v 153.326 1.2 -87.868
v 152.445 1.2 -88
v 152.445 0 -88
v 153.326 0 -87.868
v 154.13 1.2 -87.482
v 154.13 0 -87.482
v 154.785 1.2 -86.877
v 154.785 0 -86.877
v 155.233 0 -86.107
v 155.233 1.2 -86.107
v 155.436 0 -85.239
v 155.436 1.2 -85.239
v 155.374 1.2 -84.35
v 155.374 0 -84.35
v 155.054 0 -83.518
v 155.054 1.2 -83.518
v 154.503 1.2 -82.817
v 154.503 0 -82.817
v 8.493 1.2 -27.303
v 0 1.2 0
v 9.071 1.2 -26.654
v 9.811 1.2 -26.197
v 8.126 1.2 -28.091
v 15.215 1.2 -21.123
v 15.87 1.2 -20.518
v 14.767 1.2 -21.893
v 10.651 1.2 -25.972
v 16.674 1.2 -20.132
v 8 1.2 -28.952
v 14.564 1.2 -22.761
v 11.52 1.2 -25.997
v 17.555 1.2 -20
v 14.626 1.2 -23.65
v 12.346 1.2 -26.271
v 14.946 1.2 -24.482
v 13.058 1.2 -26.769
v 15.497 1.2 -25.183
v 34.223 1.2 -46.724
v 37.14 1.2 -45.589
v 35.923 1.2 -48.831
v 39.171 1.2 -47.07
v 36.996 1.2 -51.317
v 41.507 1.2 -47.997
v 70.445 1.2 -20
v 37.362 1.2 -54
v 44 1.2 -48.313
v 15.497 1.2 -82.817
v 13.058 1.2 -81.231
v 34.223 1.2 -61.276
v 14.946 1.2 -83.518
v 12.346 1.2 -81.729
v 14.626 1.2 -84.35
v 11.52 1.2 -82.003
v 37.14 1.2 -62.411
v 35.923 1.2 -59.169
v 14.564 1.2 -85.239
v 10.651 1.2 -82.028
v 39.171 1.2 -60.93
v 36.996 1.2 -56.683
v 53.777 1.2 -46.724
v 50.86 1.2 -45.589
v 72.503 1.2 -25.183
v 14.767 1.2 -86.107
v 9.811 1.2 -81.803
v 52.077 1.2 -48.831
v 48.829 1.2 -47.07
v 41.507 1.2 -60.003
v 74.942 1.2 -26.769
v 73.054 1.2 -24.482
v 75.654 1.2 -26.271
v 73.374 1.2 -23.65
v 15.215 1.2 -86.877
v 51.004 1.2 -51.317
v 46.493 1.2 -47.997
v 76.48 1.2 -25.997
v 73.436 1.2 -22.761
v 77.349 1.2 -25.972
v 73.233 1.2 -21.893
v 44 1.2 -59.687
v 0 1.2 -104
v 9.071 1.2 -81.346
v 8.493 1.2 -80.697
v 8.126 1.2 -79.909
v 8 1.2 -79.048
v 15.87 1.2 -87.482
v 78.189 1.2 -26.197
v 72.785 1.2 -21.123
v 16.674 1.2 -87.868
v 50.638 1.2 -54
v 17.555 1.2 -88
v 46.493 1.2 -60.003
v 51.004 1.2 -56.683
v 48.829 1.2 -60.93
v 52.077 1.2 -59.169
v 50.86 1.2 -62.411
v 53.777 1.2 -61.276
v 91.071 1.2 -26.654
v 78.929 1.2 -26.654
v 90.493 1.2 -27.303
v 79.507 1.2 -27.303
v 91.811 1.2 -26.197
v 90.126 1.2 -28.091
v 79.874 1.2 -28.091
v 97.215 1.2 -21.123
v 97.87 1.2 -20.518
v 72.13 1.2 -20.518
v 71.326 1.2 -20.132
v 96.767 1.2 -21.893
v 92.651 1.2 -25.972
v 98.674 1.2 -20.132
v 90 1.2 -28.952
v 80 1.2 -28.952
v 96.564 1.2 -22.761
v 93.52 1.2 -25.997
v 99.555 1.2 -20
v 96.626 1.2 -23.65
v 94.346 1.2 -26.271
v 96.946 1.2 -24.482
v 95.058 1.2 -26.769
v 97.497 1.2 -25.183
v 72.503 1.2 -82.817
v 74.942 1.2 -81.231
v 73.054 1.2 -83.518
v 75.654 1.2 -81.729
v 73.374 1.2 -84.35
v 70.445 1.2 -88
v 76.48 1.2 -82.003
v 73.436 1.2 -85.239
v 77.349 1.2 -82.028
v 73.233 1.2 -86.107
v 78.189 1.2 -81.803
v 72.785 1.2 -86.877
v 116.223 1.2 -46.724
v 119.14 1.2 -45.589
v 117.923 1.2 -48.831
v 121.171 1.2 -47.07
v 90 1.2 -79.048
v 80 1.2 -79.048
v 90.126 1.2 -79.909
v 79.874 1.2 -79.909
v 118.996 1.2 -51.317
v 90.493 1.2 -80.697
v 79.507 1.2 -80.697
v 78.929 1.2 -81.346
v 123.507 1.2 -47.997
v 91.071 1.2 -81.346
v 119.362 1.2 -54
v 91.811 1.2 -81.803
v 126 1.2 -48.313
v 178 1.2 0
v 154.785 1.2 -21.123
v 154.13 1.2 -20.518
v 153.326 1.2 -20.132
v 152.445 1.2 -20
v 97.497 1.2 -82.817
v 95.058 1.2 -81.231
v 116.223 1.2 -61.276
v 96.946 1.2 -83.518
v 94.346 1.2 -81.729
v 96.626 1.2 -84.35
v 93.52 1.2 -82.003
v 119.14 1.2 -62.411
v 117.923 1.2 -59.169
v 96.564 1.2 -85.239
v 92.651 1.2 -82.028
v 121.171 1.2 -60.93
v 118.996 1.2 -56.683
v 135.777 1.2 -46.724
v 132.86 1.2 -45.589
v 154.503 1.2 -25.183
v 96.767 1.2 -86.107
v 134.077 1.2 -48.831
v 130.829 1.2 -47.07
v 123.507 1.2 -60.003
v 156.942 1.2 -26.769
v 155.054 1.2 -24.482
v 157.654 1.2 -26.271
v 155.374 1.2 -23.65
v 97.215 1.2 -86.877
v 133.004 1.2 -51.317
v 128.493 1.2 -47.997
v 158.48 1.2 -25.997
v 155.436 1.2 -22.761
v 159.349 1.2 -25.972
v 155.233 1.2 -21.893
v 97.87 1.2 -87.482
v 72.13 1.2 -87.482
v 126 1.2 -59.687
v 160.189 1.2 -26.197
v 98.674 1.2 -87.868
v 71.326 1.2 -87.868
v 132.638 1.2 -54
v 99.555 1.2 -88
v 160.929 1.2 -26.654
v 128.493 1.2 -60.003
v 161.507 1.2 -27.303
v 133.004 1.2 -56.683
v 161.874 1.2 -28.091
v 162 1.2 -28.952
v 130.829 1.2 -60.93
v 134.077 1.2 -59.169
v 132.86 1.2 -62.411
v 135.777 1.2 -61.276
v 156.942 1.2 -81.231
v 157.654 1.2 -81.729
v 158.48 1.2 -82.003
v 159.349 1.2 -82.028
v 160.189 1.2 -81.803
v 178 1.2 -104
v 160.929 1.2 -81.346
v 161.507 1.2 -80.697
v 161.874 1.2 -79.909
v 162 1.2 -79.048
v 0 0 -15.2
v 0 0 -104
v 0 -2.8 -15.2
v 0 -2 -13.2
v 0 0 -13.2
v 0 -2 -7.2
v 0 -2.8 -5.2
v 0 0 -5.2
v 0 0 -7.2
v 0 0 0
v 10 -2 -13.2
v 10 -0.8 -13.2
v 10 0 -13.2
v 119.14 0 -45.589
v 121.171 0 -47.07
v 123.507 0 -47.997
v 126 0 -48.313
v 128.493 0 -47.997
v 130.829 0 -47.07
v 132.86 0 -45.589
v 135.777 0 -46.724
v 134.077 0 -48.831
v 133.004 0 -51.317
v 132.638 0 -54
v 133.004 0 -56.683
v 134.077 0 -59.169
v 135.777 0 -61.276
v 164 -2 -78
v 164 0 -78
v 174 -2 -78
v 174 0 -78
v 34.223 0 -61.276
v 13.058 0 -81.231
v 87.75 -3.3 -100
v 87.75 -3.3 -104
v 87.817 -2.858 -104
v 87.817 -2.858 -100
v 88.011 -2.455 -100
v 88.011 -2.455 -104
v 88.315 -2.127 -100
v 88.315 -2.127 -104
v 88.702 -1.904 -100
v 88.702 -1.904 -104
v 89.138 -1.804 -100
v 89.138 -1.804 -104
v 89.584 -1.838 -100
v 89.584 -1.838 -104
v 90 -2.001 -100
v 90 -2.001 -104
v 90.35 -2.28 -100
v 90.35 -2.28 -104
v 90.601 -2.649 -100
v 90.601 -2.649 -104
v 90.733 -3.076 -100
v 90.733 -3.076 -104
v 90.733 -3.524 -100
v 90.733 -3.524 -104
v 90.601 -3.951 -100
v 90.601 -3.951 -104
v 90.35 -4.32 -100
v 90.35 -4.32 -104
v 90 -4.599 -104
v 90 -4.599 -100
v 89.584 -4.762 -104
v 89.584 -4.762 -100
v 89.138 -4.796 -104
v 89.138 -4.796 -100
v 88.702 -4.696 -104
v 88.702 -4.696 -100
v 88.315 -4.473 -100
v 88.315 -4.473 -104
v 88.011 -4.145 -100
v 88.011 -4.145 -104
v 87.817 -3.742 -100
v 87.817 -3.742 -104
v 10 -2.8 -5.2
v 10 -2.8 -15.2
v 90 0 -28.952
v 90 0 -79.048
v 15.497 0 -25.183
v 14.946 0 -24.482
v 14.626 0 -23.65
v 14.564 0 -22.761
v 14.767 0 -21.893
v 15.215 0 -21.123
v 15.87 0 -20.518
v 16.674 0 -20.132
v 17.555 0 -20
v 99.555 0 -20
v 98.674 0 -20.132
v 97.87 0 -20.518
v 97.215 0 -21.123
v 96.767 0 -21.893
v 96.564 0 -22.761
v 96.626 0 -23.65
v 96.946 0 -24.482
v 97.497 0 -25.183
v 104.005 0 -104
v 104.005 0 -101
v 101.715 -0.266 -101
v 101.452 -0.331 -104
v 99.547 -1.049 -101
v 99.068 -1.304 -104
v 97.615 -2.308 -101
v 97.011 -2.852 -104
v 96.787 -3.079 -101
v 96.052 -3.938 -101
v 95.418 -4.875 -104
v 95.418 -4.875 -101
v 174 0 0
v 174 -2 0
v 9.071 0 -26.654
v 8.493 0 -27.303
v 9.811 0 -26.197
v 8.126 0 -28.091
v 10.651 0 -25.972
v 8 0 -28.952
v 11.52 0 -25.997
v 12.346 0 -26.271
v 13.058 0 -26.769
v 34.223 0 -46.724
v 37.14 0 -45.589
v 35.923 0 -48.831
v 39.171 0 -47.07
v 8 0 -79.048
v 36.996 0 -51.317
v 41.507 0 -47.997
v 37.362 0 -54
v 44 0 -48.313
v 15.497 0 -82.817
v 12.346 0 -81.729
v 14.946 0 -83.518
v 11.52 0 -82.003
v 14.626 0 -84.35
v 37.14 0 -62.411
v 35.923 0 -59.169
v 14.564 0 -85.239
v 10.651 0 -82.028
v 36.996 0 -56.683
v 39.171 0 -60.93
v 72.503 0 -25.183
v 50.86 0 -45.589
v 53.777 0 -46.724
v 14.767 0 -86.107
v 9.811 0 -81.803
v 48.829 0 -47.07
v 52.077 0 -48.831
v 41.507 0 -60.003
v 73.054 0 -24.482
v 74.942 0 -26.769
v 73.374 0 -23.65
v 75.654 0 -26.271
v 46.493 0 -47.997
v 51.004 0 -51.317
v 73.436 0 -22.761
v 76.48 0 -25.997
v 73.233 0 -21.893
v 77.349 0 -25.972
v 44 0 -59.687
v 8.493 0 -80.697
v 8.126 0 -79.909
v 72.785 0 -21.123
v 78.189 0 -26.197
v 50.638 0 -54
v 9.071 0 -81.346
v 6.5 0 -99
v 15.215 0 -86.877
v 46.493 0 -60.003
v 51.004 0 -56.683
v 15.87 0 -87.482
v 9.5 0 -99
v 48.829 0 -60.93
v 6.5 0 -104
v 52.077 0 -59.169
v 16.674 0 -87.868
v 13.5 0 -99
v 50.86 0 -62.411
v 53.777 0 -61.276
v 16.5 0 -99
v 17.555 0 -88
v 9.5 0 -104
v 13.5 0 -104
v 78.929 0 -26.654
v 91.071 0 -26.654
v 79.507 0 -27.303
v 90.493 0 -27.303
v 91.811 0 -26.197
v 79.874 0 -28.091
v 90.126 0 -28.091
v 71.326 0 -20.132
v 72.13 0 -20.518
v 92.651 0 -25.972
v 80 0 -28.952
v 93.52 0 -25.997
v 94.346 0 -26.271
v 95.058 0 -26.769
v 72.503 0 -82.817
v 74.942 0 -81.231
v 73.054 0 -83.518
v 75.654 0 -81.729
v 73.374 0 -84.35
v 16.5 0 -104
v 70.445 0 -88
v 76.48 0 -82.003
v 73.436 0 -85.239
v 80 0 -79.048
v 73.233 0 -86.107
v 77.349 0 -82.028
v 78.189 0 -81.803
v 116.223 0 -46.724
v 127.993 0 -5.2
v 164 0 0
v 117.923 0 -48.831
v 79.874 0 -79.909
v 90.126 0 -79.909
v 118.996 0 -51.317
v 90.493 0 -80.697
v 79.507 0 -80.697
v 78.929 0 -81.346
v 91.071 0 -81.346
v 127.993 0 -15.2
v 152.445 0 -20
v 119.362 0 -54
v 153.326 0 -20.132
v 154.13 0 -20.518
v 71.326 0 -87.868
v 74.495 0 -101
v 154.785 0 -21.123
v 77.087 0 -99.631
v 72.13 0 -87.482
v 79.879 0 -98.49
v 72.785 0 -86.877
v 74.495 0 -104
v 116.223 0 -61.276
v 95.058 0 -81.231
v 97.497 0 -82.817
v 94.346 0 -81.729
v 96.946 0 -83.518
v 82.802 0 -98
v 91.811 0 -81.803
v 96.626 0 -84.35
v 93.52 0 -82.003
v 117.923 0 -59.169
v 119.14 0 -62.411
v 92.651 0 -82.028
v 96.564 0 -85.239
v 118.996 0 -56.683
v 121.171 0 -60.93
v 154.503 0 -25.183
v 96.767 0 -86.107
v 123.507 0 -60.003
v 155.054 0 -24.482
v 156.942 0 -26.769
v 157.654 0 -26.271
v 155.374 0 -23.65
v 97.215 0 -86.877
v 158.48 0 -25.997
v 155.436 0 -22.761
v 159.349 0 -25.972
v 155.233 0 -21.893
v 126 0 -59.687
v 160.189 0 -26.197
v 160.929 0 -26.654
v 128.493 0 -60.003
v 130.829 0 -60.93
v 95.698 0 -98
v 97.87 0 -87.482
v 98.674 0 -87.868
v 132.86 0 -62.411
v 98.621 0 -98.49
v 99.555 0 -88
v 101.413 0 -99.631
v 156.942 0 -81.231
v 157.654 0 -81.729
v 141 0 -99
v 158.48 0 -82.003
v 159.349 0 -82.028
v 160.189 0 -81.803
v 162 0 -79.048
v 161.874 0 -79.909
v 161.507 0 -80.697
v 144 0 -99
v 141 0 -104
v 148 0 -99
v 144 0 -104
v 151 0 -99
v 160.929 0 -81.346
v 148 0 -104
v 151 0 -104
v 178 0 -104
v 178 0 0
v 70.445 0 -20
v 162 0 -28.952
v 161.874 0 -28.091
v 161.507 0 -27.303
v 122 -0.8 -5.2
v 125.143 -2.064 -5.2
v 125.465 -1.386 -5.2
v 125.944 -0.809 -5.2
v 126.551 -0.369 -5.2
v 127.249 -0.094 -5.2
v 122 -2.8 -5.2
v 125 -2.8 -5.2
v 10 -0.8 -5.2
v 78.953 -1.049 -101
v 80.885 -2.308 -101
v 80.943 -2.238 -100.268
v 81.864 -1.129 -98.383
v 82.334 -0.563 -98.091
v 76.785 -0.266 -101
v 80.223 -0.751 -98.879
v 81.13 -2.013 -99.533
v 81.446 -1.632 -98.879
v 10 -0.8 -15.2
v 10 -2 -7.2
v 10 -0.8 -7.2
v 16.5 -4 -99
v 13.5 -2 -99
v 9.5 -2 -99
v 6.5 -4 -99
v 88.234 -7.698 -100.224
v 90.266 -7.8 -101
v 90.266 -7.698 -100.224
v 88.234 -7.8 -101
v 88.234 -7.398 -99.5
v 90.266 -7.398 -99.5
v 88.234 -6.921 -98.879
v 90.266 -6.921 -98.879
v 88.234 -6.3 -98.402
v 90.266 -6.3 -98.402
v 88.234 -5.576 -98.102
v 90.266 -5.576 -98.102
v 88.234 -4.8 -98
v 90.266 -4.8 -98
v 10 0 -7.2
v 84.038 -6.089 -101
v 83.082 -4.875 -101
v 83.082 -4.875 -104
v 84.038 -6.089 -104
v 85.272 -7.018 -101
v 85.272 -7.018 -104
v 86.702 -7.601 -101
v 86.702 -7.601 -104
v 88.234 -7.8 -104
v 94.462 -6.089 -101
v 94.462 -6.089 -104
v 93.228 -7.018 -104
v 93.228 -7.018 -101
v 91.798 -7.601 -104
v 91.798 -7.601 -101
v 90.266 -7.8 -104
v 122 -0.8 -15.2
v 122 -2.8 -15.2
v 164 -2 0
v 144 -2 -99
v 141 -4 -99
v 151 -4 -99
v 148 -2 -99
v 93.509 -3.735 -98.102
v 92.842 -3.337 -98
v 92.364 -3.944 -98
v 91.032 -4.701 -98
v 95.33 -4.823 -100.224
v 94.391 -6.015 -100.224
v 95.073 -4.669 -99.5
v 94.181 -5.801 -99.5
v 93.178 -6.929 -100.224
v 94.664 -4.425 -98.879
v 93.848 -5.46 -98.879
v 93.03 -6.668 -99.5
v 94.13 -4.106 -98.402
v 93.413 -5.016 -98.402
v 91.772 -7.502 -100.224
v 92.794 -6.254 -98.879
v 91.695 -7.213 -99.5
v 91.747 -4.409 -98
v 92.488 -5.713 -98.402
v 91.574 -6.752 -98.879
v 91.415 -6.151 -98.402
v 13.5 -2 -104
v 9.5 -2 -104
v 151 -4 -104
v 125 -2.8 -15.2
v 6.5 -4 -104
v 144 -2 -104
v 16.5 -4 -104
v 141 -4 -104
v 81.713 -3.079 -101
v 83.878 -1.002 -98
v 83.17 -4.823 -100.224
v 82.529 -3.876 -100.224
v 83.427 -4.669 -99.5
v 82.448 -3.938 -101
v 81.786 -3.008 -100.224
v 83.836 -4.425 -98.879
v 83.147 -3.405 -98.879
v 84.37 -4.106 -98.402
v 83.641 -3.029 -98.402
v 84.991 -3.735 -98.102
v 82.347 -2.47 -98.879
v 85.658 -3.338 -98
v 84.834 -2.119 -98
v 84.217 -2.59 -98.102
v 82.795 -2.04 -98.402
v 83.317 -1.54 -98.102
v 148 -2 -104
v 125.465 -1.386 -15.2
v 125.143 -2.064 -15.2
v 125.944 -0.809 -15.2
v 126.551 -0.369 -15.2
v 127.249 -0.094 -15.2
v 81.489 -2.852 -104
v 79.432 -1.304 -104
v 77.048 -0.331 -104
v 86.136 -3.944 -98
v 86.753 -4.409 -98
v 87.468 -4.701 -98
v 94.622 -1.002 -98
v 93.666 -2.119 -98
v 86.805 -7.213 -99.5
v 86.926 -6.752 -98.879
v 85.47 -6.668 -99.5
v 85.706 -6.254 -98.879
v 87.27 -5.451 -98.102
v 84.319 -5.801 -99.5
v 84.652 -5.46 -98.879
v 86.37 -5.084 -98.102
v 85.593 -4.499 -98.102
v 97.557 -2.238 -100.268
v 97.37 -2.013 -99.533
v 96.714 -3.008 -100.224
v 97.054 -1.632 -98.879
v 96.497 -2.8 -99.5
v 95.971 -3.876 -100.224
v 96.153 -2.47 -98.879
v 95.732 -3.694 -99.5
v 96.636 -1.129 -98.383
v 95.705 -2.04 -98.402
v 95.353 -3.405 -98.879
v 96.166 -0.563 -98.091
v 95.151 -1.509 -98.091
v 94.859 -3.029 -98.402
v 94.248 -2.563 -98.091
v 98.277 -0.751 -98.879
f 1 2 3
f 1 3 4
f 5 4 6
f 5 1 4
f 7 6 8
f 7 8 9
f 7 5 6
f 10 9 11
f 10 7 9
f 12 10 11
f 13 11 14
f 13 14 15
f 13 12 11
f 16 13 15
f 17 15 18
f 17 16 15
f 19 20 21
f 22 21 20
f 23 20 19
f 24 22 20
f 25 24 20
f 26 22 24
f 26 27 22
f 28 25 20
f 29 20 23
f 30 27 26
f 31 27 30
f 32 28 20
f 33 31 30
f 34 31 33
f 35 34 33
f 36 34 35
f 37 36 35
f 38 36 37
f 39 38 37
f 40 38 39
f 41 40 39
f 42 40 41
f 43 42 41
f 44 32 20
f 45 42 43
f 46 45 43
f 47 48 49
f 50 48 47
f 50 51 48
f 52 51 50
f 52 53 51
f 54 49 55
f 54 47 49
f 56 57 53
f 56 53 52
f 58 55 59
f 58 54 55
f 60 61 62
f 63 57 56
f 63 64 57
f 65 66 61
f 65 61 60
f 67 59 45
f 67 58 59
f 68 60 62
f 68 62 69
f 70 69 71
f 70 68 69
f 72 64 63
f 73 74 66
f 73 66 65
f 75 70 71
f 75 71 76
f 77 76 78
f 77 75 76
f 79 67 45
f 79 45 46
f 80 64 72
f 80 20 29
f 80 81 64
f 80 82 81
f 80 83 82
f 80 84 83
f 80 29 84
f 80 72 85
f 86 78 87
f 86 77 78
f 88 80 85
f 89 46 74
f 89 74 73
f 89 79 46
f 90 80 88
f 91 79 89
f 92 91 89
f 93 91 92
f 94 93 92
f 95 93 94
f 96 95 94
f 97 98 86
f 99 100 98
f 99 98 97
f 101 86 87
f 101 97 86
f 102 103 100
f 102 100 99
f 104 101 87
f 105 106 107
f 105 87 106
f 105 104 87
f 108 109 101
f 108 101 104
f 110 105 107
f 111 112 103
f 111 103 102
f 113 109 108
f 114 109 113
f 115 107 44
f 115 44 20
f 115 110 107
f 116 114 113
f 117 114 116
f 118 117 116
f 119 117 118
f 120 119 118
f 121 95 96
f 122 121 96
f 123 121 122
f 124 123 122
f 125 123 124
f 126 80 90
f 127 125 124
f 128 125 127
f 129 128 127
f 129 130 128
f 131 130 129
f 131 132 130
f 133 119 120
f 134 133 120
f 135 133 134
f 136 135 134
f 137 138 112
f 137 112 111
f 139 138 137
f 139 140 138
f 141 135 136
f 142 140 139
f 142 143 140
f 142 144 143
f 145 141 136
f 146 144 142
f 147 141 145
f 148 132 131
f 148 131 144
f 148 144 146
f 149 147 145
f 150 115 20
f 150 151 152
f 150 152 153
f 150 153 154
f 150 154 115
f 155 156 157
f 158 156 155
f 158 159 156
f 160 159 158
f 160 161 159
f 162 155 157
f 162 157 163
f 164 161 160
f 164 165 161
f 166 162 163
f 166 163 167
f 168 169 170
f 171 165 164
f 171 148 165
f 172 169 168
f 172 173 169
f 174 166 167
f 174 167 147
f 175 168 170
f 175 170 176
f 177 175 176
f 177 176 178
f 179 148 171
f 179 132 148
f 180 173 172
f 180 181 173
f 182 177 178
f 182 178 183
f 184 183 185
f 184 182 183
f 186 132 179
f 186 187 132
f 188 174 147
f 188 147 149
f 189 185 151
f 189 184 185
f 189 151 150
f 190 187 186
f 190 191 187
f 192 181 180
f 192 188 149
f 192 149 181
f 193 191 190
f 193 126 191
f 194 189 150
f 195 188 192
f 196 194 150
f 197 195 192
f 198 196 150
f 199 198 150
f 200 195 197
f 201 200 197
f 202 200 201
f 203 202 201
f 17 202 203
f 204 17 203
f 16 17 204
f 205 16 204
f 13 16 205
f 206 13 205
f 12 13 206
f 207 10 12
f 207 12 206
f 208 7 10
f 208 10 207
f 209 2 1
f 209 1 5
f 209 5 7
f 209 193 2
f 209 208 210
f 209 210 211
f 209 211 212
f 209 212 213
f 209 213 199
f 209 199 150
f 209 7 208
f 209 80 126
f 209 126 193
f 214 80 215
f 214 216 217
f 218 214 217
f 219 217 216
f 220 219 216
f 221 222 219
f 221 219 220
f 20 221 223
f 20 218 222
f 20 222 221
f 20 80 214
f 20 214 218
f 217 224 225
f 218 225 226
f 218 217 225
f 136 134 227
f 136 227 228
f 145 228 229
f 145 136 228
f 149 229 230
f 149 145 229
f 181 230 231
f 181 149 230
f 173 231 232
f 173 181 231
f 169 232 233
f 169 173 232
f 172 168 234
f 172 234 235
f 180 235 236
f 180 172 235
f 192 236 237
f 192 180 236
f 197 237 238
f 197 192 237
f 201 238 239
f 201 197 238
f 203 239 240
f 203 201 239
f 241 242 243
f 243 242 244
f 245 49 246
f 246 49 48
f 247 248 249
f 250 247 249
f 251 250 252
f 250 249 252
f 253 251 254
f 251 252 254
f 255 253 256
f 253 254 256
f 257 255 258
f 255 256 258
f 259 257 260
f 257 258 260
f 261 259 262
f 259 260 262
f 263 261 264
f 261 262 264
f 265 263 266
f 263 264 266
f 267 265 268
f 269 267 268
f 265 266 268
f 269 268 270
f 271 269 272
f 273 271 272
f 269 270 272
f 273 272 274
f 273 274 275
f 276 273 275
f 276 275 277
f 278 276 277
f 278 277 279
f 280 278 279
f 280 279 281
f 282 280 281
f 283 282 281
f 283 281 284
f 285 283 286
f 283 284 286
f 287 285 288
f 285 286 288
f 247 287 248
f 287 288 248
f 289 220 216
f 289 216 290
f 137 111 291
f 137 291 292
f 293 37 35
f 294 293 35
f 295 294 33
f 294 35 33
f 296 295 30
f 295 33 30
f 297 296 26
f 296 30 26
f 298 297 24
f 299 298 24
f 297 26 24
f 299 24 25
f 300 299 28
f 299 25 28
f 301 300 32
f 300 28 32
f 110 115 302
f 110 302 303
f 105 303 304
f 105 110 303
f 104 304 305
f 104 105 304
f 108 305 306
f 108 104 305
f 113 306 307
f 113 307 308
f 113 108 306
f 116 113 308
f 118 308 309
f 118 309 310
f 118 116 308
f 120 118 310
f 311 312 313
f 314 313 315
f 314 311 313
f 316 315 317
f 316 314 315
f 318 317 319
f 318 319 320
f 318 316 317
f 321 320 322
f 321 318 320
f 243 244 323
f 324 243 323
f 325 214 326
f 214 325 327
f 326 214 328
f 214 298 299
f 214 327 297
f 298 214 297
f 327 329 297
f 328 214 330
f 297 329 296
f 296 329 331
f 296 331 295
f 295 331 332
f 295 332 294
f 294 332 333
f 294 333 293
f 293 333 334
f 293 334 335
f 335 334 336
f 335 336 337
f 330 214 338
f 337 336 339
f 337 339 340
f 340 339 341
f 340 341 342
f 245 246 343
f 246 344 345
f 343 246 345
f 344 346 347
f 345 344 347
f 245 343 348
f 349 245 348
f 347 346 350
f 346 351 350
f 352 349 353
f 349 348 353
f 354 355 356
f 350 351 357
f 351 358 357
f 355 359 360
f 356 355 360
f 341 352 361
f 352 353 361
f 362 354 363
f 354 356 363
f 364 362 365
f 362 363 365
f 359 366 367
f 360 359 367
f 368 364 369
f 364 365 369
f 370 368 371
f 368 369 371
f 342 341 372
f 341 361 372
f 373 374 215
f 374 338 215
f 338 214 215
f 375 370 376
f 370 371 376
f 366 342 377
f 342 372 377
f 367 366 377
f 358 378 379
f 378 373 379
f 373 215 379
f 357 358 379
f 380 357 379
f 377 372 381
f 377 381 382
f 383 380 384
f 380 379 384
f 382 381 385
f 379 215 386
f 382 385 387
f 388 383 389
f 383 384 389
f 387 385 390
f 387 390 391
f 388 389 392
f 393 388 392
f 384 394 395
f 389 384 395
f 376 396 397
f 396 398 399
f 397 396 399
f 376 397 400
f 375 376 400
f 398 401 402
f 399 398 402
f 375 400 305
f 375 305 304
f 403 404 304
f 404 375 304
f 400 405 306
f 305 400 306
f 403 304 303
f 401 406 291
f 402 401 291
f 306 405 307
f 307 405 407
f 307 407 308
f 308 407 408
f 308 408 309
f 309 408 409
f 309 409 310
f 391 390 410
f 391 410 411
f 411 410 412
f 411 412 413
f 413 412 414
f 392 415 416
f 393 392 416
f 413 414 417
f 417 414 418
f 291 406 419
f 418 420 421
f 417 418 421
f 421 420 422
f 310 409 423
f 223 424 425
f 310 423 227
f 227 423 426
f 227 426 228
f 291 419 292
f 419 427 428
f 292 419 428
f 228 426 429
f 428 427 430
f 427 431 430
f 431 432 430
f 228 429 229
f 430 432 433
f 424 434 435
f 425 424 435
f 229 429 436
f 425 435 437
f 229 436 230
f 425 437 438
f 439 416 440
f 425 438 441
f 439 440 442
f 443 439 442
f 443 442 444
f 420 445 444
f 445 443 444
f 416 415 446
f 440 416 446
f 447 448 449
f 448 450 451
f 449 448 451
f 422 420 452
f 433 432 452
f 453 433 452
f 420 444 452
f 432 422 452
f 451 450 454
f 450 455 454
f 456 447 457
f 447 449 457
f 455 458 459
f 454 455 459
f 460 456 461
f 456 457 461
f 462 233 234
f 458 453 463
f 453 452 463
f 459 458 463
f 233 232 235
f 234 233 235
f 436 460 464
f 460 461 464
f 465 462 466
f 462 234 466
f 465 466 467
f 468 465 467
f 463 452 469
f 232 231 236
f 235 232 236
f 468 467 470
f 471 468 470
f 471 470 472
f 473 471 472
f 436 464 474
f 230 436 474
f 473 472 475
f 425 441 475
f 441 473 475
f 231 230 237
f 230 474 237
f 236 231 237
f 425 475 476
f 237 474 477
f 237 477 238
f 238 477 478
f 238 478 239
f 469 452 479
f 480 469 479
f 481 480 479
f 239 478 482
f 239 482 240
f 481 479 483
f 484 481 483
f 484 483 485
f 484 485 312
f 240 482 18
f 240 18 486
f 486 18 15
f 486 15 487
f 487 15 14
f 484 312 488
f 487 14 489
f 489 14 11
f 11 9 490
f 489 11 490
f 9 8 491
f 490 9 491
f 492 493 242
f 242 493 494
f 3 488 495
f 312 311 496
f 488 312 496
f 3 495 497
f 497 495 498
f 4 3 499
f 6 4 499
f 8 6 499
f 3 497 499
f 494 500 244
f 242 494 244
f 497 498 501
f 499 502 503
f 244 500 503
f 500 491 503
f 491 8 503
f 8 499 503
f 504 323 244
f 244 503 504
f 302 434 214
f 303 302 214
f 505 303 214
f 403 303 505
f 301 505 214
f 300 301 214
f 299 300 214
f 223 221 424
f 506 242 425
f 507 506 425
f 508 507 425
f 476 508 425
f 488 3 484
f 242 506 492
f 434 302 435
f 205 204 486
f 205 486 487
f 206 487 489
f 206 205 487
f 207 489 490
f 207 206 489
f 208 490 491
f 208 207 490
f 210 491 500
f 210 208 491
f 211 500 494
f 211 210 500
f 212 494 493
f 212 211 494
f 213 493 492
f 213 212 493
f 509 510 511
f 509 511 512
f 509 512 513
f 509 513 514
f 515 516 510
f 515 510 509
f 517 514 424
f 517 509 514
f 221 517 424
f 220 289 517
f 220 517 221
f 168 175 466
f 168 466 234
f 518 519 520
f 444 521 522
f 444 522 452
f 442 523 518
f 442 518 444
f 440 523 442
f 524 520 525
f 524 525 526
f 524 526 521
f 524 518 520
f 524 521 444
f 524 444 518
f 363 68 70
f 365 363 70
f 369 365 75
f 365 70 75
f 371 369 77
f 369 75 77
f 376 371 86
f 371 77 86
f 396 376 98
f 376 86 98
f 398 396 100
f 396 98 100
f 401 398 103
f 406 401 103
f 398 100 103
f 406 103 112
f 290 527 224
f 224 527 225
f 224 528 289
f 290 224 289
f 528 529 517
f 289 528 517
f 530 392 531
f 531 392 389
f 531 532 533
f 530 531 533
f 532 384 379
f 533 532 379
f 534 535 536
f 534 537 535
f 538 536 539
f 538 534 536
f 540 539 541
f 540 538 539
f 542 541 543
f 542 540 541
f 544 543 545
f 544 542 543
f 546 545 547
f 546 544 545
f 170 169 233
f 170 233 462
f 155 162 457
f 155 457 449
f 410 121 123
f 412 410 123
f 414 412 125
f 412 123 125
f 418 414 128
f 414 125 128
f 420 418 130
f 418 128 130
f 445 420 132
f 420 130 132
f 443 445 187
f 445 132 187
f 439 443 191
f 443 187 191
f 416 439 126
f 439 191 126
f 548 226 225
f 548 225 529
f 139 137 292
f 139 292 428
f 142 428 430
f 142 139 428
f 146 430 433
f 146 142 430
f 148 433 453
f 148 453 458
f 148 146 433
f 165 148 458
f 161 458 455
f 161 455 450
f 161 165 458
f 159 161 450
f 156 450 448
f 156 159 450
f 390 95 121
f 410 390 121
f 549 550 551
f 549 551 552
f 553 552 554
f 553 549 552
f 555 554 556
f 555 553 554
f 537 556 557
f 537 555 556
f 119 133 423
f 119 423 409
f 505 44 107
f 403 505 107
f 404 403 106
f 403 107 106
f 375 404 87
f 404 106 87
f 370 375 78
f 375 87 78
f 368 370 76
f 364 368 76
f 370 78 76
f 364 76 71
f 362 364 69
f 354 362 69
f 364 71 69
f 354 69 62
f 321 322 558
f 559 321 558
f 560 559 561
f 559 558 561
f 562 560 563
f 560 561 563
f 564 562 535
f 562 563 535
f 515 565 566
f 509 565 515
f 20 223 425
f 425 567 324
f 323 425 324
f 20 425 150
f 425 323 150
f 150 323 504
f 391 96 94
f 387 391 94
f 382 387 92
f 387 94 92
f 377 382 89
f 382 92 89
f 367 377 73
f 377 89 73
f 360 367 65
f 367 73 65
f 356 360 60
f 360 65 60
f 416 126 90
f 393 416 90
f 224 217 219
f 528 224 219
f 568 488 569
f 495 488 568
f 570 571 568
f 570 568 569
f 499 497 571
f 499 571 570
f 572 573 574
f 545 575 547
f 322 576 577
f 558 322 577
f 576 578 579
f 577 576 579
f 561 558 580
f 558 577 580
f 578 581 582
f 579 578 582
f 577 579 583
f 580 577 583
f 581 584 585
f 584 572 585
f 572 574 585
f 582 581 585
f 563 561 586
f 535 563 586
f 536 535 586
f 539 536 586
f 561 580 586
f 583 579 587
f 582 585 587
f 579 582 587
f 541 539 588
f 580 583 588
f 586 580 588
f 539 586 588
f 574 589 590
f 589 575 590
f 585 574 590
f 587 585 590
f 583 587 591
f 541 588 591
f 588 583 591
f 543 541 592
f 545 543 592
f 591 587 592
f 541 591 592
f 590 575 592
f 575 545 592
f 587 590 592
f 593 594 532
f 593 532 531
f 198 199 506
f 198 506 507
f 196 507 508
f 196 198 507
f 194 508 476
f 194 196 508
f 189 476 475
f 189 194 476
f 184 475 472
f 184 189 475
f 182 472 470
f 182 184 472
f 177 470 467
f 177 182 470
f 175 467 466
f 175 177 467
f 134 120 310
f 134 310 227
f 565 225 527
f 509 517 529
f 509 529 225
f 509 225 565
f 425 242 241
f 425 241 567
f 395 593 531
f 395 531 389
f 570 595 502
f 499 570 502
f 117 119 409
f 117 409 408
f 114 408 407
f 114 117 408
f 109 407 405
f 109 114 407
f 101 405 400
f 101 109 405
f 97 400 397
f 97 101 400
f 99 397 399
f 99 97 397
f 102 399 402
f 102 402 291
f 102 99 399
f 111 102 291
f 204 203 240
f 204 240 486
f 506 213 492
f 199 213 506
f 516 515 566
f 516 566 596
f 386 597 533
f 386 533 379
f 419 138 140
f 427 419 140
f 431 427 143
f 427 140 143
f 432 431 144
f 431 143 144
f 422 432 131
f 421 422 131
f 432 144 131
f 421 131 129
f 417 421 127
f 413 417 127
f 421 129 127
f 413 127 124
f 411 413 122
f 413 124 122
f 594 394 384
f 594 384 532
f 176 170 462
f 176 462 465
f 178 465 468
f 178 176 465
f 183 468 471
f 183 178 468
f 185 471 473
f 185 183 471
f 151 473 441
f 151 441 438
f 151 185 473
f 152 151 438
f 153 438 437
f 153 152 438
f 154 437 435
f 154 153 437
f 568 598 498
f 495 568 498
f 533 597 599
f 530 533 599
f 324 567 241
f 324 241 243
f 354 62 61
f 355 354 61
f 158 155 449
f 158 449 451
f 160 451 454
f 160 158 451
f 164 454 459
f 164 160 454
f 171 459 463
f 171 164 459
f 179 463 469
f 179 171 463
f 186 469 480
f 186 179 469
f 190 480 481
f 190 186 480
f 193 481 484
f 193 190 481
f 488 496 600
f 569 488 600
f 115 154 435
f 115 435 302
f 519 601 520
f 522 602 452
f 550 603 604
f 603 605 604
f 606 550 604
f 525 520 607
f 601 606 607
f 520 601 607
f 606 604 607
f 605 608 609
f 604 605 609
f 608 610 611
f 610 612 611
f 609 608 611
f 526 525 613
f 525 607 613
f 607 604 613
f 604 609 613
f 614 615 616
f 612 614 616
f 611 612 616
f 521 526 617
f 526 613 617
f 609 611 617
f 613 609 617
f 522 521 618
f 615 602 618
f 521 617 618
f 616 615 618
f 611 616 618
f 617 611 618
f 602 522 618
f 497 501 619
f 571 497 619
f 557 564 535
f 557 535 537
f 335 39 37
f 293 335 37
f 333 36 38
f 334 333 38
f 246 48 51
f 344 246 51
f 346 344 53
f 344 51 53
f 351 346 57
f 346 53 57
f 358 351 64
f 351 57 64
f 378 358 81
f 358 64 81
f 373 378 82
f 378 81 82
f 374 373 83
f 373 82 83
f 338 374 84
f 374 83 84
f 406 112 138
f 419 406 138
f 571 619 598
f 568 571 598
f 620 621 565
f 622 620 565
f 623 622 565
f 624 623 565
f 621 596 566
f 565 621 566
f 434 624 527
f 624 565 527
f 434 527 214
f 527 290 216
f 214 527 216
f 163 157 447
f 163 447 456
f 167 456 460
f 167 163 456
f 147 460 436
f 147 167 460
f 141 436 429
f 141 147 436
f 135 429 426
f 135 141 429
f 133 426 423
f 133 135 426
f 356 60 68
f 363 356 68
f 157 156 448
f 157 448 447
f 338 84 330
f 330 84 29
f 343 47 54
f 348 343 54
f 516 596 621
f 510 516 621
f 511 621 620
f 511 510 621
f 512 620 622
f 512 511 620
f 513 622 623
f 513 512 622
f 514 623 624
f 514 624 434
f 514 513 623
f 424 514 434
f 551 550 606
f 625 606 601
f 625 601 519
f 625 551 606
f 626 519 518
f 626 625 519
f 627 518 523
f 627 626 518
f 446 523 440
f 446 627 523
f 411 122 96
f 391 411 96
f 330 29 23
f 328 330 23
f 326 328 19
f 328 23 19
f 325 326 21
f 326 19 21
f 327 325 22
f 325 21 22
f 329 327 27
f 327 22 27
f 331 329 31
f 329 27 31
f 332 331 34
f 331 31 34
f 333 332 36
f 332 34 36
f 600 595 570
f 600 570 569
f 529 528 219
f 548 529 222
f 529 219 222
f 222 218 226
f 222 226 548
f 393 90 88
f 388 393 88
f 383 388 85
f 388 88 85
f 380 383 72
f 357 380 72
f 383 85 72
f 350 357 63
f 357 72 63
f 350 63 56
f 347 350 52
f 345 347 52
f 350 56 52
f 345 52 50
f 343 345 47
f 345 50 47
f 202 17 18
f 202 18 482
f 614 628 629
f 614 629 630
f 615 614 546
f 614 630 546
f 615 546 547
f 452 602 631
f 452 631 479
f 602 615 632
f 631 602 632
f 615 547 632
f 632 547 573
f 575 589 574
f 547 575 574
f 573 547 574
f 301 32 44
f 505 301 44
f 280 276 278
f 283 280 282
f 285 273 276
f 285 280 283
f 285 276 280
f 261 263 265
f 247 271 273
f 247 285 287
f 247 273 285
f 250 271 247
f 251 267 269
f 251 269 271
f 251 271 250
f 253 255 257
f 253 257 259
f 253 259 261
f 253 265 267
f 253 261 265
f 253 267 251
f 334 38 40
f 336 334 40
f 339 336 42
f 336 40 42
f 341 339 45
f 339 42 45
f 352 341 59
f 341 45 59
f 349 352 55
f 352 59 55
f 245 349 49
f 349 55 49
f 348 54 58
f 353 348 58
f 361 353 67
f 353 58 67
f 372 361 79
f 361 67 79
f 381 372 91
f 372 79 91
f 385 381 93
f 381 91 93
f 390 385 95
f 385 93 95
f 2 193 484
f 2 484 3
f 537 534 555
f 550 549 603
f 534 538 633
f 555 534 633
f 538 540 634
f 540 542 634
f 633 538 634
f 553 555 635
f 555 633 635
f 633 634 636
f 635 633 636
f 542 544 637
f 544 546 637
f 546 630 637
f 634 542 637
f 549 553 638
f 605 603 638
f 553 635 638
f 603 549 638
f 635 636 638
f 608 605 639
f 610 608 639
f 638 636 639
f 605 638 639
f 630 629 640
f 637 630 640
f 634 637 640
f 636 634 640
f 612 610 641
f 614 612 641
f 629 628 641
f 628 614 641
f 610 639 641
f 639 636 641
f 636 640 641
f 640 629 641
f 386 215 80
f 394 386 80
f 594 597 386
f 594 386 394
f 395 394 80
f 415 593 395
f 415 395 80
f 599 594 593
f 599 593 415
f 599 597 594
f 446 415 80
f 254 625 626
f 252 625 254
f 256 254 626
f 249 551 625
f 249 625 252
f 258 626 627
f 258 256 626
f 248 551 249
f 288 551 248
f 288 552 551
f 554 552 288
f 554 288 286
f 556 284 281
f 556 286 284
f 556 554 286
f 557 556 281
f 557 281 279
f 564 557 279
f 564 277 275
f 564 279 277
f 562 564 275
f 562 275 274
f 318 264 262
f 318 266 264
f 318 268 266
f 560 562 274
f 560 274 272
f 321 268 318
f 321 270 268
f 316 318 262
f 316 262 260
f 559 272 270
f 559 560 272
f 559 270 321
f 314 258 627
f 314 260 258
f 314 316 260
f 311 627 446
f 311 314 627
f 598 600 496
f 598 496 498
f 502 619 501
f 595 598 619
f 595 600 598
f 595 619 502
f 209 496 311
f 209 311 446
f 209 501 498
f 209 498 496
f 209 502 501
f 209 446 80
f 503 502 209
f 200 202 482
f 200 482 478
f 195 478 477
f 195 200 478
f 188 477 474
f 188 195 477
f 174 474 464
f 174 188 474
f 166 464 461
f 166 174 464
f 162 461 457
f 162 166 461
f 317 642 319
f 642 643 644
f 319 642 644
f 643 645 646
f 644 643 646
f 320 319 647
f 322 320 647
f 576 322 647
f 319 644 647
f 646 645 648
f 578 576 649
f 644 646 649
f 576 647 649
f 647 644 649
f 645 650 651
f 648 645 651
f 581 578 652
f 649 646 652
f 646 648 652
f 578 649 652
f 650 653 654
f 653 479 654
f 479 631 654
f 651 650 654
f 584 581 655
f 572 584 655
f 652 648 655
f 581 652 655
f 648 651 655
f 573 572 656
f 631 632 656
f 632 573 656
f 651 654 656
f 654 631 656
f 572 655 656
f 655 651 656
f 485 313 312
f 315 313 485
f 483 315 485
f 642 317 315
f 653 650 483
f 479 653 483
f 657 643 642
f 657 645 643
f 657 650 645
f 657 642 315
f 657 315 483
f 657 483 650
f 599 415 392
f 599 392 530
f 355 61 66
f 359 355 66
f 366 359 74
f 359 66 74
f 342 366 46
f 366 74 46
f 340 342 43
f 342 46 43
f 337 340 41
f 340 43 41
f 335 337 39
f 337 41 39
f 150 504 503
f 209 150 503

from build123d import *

# Parameters (mm, degrees)
SKETCH1_W           = 178
SKETCH1_H           = 104
SKETCH1_W_2         = 72
SKETCH1_H_2         = 68
BOSS_EXTRUDE1_DEPTH = 1.2
BOSS_EXTRUDE2_DEPTH = 5
SKETCH3_W           = 112
SKETCH3_H           = 10
BOSS_EXTRUDE3_DEPTH = 0.8
SKETCH4_W           = 10
SKETCH4_H           = 10
BOSS_EXTRUDE4_DEPTH = 2.8
SKETCH5_W           = 6
SKETCH5_H           = 2
CUT_EXTRUDE1_DEPTH  = 10
SKETCH6_W           = 10
SKETCH6_H           = 7.8
BOSS_EXTRUDE5_DEPTH = 6
FILLET1_R           = 10
FILLET2_R           = 6
SKETCH7_R           = 1.5
CUT_EXTRUDE2_DEPTH  = 4
FILLET3_R           = 3
SKETCH8_W           = 3
SKETCH8_H           = 10
BOSS_EXTRUDE6_DEPTH = 2.8
FILLET4_R           = 3
SKETCH9_W           = 10
SKETCH9_H           = 78
BOSS_EXTRUDE7_DEPTH = 2
BOSS_EXTRUDE8_DEPTH = 1.2


with BuildPart() as part:
    # Sketch1 → Boss-Extrude1 (new body)
    with BuildSketch(Plane(origin=(0, 0, 0), x_dir=(1, 0, 0), z_dir=(0, 1, 0))):
        with Locations((89, 52)):
            Rectangle(SKETCH1_W, SKETCH1_H)
        with Locations((126, 54)):
            Rectangle(SKETCH1_W_2, SKETCH1_H_2, mode=Mode.SUBTRACT)
        with Locations((44, 54)):
            Rectangle(SKETCH1_W_2, SKETCH1_H_2, mode=Mode.SUBTRACT)
    extrude(amount=BOSS_EXTRUDE1_DEPTH)

    # Sketch2 → Boss-Extrude2 (add)
    with BuildSketch(Plane(origin=(0, 0, -104), x_dir=(-1, 0, 0), z_dir=(0, 0, -1))):
        Polygon((-151, 0), (-148, 0), (-148, -2), (-144, -2), (-144, 0), (-141, 0), (-141, -4), (-144, -4), (-148, -4), (-151, -4), align=None)
    boss_extrude2 = extrude(amount=-BOSS_EXTRUDE2_DEPTH)

    # Mirror1: Boss-Extrude2 across plane
    add(boss_extrude2.mirror(Plane.ZY.offset(-78.75)))

    # Sketch3 → Boss-Extrude3 (add)
    with BuildSketch(Plane.XZ):
        with Locations((66, -10.2)):
            Rectangle(SKETCH3_W, SKETCH3_H)
    extrude(amount=BOSS_EXTRUDE3_DEPTH)

    # Sketch4 → Boss-Extrude4 (add)
    with BuildSketch(Plane.XZ):
        with Locations((5, -10.2)):
            Rectangle(SKETCH4_W, SKETCH4_H)
    extrude(amount=BOSS_EXTRUDE4_DEPTH)

    # Sketch5 → Cut-Extrude1 (cut)
    with BuildSketch(Plane.ZY):
        with Locations((-10.2, -1)):
            Rectangle(SKETCH5_W, SKETCH5_H)
    extrude(amount=-CUT_EXTRUDE1_DEPTH, mode=Mode.SUBTRACT)

    # Sketch6 → Boss-Extrude5 (add)
    with BuildSketch(Plane(origin=(0, 0, -104), x_dir=(-1, 0, 0), z_dir=(0, 0, -1))):
        with Locations((-89.25, -3.9)):
            Rectangle(SKETCH6_W, SKETCH6_H)
    extrude(amount=-BOSS_EXTRUDE5_DEPTH)

    # Fillet1
    # the kernel refuses this fillet: 10 mm, written as the material it adds along each edge
    with BuildSketch(Plane(origin=(94.25, 0, -104), x_dir=(1, 0, 0), z_dir=(0, 0, 1))) as fillet1_piece_1:
        with BuildLine():
            CenterArc((9.754998719, -10), FILLET1_R, 90, 77.290967006)
            Line((0, -7.8), (0, 0))
            Line((0, 0), (9.754998719, 0))
        make_face()
    extrude(amount=6)
    with BuildSketch(Plane(origin=(84.25, 0, -104), x_dir=(-1, 0, 0), z_dir=(0, 0, 1))) as fillet1_piece_2:
        with BuildLine():
            CenterArc((9.754998719, 10), FILLET1_R, 192.709032994, 77.290967006)
            Line((0, 7.8), (0, 0))
            Line((0, 0), (9.754998719, 0))
        make_face()
    extrude(amount=6)

    # Fillet2
    fillet2_edges = [part.edges().sort_by_distance(p)[0] for p in [
        (94.25, -7.8, -101),
        (84.25, -7.8, -101),
    ]]
    fillet(fillet2_edges, radius=FILLET2_R)

    # Sketch7 → Cut-Extrude2 (cut)
    with BuildSketch(Plane(origin=(0, 0, -104), x_dir=(-1, 0, 0), z_dir=(0, 0, -1))):
        with Locations((-89.25, -3.3)):
            Circle(SKETCH7_R)
    extrude(amount=-CUT_EXTRUDE2_DEPTH, mode=Mode.SUBTRACT)

    # Fillet3
    fillet3_edges = [part.edges().sort_by_distance(p)[0] for p in [
        (79.432105696, -1.303736435, -98),
        (99.067894304, -1.303736435, -98),
        (89.25, -7.8, -98),
        (85.271734229, -7.017758139, -98),
        (93.228265771, -7.017758139, -98),
    ]]
    fillet(fillet3_edges, radius=FILLET3_R)

    # Sketch8 → Boss-Extrude6 (add)
    with BuildSketch(Plane.XZ):
        with Locations((123.5, -10.2)):
            Rectangle(SKETCH8_W, SKETCH8_H)
    extrude(amount=BOSS_EXTRUDE6_DEPTH)

    # Fillet4
    # the kernel refuses this fillet: 3 mm, written as the material it adds along each edge
    with BuildSketch(Plane(origin=(125, 0, -5.2), x_dir=(1, 0, 0), z_dir=(0, 0, -1))) as fillet4_piece_1:
        with BuildLine():
            CenterArc((2.993325909, 3), FILLET4_R, 183.822553729, 86.177446271)
            Line((0, 2.8), (-0.059866518, 2.796))
            ThreePointArc((-0.059866518, 2.796), (-0.06, 1.4), (-0.06, 0))
            Line((-0.06, 0), (0, -0.06))
            Line((0, -0.06), (2.993325909, -0.06))
            Line((2.993325909, -0.06), (2.993325909, 0))
        make_face()
    extrude(amount=10)

    # Sketch9 → Boss-Extrude7 (add)
    with BuildSketch(Plane.XZ):
        with Locations((169, -39)):
            Rectangle(SKETCH9_W, SKETCH9_H)
    extrude(amount=BOSS_EXTRUDE7_DEPTH)

    # Sketch10 → Boss-Extrude8 (add)
    with BuildSketch(Plane(origin=(0, 1.2, 0), x_dir=(1, 0, 0), z_dir=(0, 1, 0))):
        with BuildLine():
            Line((15.496875383, 82.817231781), (37.139871313, 62.410978476))
            ThreePointArc((37.139871313, 62.410978476), (44, 59.686872538), (50.860128687, 62.410978476))
            Line((50.860128687, 62.410978476), (72.503124617, 82.817231781))
            ThreePointArc((72.503124617, 82.817231781), (73.233302704, 86.107180054), (70.445086011, 88))
            Line((70.445086011, 88), (53.755491102, 88))
            Line((53.755491102, 88), (53.755491102, 92.773114393))
            Line((53.755491102, 92.773114393), (83.607486332, 92.773114393))
            Line((83.607486332, 92.773114393), (83.607486332, 57.500394296))
            Line((83.607486332, 57.500394296), (80, 57.500394296))
            Line((80, 57.500394296), (80, 79.048223953))
            ThreePointArc((80, 79.048223953), (78.188672407, 81.802685408), (74.941961394, 81.230992171))
            Line((74.941961394, 81.230992171), (53.777463399, 61.275894062))
            ThreePointArc((53.777463399, 61.275894062), (50.637592086, 54), (53.777463399, 46.724105938))
            Line((53.777463399, 46.724105938), (74.941961394, 26.769007829))
            ThreePointArc((74.941961394, 26.769007829), (78.188672407, 26.197314592), (80, 28.951776047))
            Line((80, 28.951776047), (80, 51.757328614))
            Line((80, 51.757328614), (83.607486332, 51.757328614))
            Line((83.607486332, 51.757328614), (83.607486332, 17.03280878))
            Line((83.607486332, 17.03280878), (48.474442735, 17.03280878))
            Line((48.474442735, 17.03280878), (48.474442735, 20))
            Line((48.474442735, 20), (70.445086011, 20))
            ThreePointArc((70.445086011, 20), (73.233302704, 21.892819946), (72.503124617, 25.182768219))
            Line((72.503124617, 25.182768219), (50.860128687, 45.589021524))
            ThreePointArc((50.860128687, 45.589021524), (44, 48.313127462), (37.139871313, 45.589021524))
            Line((37.139871313, 45.589021524), (15.496875383, 25.182768219))
            ThreePointArc((15.496875383, 25.182768219), (14.766697296, 21.892819946), (17.554913989, 20))
            Line((17.554913989, 20), (45.016619204, 20))
            Line((45.016619204, 20), (45.016619204, 17.03280878))
            Line((45.016619204, 17.03280878), (3.455124081, 17.03280878))
            Line((3.455124081, 17.03280878), (3.455124081, 51.757328614))
            Line((3.455124081, 51.757328614), (8, 51.757328614))
            Line((8, 51.757328614), (8, 28.951776047))
            ThreePointArc((8, 28.951776047), (9.811327593, 26.197314592), (13.058038606, 26.769007829))
            Line((13.058038606, 26.769007829), (34.222536601, 46.724105938))
            ThreePointArc((34.222536601, 46.724105938), (37.362407914, 54), (34.222536601, 61.275894062))
            Line((34.222536601, 61.275894062), (13.058038606, 81.230992171))
            ThreePointArc((13.058038606, 81.230992171), (9.811327593, 81.802685408), (8, 79.048223953))
            Line((8, 79.048223953), (8, 56.332794756))
            Line((8, 56.332794756), (3.455124081, 56.332794756))
            Line((3.455124081, 56.332794756), (3.455124081, 92.773114393))
            Line((3.455124081, 92.773114393), (41.529538769, 92.773114393))
            Line((41.529538769, 92.773114393), (41.529538769, 88))
            Line((41.529538769, 88), (17.554913989, 88))
            ThreePointArc((17.554913989, 88), (14.766697296, 86.107180054), (15.496875383, 82.817231781))
        make_face()
    boss_extrude8 = extrude(amount=-BOSS_EXTRUDE8_DEPTH)

    # Mirror2: Boss-Extrude8 across plane
    add(boss_extrude8.mirror(Plane(origin=(85, 0, 0), x_dir=(0, 0, 1), z_dir=(1, 0, 0))))


solid = part.part
